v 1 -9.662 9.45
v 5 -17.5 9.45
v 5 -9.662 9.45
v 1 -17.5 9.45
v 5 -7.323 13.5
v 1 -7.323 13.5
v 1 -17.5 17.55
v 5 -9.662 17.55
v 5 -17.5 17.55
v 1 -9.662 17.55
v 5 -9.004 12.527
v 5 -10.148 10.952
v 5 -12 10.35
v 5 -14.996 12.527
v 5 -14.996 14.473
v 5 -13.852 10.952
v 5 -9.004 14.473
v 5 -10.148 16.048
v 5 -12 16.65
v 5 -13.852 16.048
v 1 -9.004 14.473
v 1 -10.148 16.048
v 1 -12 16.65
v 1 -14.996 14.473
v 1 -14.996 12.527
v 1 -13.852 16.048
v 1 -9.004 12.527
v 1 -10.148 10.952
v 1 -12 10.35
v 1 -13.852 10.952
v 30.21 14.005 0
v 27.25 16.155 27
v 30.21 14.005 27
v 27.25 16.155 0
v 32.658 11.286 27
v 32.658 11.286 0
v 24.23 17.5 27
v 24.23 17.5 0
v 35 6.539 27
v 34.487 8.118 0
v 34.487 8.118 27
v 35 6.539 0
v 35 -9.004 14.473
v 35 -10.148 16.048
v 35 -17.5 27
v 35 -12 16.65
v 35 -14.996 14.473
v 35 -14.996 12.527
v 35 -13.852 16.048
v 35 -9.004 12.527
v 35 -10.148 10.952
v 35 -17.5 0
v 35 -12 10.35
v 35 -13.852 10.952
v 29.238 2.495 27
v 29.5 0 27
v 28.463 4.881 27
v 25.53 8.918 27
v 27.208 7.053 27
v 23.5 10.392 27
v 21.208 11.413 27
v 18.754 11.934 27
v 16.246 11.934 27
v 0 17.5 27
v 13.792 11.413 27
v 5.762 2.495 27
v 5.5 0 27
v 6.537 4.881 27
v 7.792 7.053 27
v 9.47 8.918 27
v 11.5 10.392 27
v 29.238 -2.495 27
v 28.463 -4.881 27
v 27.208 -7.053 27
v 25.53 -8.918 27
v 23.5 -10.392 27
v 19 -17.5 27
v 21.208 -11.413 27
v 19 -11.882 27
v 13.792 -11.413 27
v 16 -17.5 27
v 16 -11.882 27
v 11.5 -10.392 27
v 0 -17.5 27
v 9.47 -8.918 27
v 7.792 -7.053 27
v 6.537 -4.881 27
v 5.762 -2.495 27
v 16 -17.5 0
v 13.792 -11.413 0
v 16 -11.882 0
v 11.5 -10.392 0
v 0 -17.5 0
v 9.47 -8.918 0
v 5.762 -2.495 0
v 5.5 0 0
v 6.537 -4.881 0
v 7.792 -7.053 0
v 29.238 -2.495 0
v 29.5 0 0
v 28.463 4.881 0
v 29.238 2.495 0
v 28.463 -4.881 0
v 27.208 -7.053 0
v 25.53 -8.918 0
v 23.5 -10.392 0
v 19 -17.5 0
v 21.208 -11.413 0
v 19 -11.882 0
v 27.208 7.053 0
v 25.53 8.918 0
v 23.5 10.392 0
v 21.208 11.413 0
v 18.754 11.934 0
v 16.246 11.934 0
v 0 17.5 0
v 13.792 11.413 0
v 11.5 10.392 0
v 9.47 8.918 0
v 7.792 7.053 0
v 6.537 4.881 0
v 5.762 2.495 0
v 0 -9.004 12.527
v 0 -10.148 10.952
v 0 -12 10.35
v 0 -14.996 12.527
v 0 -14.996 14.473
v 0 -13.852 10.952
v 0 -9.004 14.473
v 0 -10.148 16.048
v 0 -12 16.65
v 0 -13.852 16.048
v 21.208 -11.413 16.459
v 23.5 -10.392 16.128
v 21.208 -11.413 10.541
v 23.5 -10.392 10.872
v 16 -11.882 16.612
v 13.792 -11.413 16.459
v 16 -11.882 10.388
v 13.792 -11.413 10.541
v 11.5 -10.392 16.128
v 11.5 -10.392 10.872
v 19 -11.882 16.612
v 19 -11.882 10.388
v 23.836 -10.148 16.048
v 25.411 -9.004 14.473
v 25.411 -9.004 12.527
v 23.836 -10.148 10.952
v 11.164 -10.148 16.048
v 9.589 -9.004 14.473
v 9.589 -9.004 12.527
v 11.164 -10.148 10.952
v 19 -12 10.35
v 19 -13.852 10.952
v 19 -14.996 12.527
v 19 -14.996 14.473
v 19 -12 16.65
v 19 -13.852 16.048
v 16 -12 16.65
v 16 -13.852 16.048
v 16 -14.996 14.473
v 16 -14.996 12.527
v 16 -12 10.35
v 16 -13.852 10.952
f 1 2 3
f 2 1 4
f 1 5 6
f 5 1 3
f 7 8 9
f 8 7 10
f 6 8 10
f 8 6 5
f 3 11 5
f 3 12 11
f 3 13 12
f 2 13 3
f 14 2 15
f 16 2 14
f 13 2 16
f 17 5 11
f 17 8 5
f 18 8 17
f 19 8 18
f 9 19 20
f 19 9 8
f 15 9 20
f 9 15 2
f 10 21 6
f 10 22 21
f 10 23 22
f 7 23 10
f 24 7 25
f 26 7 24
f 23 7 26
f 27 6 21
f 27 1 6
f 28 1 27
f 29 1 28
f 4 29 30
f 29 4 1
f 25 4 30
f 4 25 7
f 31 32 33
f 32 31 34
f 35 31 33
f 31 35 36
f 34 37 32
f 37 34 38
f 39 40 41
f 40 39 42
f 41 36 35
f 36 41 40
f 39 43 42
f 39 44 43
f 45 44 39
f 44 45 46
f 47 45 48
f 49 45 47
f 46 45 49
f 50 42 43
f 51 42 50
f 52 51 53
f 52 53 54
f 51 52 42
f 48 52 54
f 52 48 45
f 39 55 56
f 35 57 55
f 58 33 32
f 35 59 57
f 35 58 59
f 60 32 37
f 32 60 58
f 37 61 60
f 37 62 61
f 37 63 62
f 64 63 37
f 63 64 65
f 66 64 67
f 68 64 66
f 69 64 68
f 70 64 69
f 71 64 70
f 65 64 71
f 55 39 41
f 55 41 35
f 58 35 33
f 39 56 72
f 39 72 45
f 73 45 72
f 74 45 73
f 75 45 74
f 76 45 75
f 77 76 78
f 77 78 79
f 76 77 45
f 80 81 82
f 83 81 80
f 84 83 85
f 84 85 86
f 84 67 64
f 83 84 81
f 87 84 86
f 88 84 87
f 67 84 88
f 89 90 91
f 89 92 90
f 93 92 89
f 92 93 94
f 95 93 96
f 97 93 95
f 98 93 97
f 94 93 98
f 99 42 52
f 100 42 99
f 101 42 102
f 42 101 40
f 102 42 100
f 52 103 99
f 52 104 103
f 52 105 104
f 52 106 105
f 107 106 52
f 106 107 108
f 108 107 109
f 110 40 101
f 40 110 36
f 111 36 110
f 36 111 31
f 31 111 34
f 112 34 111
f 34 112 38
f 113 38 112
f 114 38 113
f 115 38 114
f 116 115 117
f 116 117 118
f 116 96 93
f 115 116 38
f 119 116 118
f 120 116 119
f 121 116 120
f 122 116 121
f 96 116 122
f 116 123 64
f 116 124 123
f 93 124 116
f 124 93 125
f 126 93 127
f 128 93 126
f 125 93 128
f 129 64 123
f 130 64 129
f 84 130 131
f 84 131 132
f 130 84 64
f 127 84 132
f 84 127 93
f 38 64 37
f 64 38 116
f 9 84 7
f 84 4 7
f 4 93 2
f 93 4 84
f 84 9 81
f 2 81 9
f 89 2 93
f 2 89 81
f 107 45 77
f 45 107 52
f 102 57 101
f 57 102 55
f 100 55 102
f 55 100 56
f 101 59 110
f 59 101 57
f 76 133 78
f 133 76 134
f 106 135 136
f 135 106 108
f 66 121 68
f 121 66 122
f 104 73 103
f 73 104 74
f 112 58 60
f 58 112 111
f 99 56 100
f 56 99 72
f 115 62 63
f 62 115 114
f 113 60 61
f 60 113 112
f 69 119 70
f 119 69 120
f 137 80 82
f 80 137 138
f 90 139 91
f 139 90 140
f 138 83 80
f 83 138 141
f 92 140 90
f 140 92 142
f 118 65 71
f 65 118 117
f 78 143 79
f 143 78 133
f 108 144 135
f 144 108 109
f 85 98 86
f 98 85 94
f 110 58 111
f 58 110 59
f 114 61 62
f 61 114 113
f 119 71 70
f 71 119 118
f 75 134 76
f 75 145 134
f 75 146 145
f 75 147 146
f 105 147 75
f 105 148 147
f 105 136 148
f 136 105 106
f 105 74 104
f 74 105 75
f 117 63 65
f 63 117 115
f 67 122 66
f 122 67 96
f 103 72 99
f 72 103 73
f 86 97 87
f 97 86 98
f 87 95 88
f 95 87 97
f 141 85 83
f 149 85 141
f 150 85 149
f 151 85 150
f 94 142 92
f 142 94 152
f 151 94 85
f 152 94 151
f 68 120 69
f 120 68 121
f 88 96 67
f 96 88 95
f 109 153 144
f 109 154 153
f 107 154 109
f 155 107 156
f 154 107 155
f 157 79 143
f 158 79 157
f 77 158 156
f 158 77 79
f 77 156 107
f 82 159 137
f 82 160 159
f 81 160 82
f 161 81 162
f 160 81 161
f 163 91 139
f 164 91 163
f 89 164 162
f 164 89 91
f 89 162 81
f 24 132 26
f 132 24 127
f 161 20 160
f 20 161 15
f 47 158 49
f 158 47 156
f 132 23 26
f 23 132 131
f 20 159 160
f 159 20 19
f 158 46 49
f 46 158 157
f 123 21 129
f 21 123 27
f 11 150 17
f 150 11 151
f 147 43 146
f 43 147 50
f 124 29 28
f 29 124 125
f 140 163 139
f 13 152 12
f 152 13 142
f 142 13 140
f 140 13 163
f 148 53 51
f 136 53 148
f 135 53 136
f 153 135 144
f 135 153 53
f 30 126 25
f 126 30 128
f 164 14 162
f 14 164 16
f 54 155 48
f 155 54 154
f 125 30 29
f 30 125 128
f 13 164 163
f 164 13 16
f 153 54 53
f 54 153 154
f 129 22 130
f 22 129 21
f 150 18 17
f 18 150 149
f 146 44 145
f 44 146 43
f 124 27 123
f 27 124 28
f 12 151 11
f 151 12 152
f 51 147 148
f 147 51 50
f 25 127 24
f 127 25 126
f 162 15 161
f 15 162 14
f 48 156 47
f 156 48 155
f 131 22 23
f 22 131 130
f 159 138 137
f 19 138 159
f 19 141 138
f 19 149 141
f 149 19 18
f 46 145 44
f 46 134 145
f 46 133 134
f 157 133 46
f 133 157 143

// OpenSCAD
// file: util.scad
module fillet(r=10, h=100) {
  difference() {
    cube([r, r, h]);
    translate([r, r, -1])
      cylinder(r=r, h=h+2);
  }
}
// main file
use <util.scad>

module pole_clamp(
  id=24,
  h=27,
  w=35,
  slot=3,
  bolt_d=6.3,
  bolt_z_offset=0,   // distance off-center
  bolt_y_offset=0,   // distance off-tangent of main bore
  bolt_hex=8.1,     // wrench size for hex-nut
  bolt_hex_height=4, // thickness of hex-nut
  nut_x_offset=1,    // x-position of captive hex-nut
  $e=1
) {
  difference() {

    // Main cube
    translate([0, w/-2, 0])
      cube([w, w, h]);

    // Bore a center hole
    translate([w/2,0,0-$e])
      cylinder(r=id/2,h=30+(2*$e));

    // Create a slot
    translate([(w-slot)/2, -1*w, 0-$e])
      cube([slot, w, h+(2*$e)]);

    // Clamp bolt hole
    translate([0, id/-2 - bolt_y_offset, h/2 + bolt_z_offset])
    rotate([0, 90, 0])
      cylinder(r=bolt_d/2, h=w+$e);

    // Captive clamp nut
    nut_diameter=bolt_hex / (sqrt(3)/2);
    translate([nut_x_offset, id/-2 - bolt_y_offset, h/2 + bolt_z_offset])
    rotate([90, 0, 90])
    union() {
      cylinder(r=nut_diameter/2, h=bolt_hex_height, $fn=6);
      translate([0-w, bolt_hex/-2, 0])
      cube([w, bolt_hex, bolt_hex_height]);
    }

    // Fillet
    translate([w+$e, w/2+$e, 0-$e])
    rotate([0,0, 180])
      fillet(r=w/2, h=h+(2*$e));
  }

}

pole_clamp();
